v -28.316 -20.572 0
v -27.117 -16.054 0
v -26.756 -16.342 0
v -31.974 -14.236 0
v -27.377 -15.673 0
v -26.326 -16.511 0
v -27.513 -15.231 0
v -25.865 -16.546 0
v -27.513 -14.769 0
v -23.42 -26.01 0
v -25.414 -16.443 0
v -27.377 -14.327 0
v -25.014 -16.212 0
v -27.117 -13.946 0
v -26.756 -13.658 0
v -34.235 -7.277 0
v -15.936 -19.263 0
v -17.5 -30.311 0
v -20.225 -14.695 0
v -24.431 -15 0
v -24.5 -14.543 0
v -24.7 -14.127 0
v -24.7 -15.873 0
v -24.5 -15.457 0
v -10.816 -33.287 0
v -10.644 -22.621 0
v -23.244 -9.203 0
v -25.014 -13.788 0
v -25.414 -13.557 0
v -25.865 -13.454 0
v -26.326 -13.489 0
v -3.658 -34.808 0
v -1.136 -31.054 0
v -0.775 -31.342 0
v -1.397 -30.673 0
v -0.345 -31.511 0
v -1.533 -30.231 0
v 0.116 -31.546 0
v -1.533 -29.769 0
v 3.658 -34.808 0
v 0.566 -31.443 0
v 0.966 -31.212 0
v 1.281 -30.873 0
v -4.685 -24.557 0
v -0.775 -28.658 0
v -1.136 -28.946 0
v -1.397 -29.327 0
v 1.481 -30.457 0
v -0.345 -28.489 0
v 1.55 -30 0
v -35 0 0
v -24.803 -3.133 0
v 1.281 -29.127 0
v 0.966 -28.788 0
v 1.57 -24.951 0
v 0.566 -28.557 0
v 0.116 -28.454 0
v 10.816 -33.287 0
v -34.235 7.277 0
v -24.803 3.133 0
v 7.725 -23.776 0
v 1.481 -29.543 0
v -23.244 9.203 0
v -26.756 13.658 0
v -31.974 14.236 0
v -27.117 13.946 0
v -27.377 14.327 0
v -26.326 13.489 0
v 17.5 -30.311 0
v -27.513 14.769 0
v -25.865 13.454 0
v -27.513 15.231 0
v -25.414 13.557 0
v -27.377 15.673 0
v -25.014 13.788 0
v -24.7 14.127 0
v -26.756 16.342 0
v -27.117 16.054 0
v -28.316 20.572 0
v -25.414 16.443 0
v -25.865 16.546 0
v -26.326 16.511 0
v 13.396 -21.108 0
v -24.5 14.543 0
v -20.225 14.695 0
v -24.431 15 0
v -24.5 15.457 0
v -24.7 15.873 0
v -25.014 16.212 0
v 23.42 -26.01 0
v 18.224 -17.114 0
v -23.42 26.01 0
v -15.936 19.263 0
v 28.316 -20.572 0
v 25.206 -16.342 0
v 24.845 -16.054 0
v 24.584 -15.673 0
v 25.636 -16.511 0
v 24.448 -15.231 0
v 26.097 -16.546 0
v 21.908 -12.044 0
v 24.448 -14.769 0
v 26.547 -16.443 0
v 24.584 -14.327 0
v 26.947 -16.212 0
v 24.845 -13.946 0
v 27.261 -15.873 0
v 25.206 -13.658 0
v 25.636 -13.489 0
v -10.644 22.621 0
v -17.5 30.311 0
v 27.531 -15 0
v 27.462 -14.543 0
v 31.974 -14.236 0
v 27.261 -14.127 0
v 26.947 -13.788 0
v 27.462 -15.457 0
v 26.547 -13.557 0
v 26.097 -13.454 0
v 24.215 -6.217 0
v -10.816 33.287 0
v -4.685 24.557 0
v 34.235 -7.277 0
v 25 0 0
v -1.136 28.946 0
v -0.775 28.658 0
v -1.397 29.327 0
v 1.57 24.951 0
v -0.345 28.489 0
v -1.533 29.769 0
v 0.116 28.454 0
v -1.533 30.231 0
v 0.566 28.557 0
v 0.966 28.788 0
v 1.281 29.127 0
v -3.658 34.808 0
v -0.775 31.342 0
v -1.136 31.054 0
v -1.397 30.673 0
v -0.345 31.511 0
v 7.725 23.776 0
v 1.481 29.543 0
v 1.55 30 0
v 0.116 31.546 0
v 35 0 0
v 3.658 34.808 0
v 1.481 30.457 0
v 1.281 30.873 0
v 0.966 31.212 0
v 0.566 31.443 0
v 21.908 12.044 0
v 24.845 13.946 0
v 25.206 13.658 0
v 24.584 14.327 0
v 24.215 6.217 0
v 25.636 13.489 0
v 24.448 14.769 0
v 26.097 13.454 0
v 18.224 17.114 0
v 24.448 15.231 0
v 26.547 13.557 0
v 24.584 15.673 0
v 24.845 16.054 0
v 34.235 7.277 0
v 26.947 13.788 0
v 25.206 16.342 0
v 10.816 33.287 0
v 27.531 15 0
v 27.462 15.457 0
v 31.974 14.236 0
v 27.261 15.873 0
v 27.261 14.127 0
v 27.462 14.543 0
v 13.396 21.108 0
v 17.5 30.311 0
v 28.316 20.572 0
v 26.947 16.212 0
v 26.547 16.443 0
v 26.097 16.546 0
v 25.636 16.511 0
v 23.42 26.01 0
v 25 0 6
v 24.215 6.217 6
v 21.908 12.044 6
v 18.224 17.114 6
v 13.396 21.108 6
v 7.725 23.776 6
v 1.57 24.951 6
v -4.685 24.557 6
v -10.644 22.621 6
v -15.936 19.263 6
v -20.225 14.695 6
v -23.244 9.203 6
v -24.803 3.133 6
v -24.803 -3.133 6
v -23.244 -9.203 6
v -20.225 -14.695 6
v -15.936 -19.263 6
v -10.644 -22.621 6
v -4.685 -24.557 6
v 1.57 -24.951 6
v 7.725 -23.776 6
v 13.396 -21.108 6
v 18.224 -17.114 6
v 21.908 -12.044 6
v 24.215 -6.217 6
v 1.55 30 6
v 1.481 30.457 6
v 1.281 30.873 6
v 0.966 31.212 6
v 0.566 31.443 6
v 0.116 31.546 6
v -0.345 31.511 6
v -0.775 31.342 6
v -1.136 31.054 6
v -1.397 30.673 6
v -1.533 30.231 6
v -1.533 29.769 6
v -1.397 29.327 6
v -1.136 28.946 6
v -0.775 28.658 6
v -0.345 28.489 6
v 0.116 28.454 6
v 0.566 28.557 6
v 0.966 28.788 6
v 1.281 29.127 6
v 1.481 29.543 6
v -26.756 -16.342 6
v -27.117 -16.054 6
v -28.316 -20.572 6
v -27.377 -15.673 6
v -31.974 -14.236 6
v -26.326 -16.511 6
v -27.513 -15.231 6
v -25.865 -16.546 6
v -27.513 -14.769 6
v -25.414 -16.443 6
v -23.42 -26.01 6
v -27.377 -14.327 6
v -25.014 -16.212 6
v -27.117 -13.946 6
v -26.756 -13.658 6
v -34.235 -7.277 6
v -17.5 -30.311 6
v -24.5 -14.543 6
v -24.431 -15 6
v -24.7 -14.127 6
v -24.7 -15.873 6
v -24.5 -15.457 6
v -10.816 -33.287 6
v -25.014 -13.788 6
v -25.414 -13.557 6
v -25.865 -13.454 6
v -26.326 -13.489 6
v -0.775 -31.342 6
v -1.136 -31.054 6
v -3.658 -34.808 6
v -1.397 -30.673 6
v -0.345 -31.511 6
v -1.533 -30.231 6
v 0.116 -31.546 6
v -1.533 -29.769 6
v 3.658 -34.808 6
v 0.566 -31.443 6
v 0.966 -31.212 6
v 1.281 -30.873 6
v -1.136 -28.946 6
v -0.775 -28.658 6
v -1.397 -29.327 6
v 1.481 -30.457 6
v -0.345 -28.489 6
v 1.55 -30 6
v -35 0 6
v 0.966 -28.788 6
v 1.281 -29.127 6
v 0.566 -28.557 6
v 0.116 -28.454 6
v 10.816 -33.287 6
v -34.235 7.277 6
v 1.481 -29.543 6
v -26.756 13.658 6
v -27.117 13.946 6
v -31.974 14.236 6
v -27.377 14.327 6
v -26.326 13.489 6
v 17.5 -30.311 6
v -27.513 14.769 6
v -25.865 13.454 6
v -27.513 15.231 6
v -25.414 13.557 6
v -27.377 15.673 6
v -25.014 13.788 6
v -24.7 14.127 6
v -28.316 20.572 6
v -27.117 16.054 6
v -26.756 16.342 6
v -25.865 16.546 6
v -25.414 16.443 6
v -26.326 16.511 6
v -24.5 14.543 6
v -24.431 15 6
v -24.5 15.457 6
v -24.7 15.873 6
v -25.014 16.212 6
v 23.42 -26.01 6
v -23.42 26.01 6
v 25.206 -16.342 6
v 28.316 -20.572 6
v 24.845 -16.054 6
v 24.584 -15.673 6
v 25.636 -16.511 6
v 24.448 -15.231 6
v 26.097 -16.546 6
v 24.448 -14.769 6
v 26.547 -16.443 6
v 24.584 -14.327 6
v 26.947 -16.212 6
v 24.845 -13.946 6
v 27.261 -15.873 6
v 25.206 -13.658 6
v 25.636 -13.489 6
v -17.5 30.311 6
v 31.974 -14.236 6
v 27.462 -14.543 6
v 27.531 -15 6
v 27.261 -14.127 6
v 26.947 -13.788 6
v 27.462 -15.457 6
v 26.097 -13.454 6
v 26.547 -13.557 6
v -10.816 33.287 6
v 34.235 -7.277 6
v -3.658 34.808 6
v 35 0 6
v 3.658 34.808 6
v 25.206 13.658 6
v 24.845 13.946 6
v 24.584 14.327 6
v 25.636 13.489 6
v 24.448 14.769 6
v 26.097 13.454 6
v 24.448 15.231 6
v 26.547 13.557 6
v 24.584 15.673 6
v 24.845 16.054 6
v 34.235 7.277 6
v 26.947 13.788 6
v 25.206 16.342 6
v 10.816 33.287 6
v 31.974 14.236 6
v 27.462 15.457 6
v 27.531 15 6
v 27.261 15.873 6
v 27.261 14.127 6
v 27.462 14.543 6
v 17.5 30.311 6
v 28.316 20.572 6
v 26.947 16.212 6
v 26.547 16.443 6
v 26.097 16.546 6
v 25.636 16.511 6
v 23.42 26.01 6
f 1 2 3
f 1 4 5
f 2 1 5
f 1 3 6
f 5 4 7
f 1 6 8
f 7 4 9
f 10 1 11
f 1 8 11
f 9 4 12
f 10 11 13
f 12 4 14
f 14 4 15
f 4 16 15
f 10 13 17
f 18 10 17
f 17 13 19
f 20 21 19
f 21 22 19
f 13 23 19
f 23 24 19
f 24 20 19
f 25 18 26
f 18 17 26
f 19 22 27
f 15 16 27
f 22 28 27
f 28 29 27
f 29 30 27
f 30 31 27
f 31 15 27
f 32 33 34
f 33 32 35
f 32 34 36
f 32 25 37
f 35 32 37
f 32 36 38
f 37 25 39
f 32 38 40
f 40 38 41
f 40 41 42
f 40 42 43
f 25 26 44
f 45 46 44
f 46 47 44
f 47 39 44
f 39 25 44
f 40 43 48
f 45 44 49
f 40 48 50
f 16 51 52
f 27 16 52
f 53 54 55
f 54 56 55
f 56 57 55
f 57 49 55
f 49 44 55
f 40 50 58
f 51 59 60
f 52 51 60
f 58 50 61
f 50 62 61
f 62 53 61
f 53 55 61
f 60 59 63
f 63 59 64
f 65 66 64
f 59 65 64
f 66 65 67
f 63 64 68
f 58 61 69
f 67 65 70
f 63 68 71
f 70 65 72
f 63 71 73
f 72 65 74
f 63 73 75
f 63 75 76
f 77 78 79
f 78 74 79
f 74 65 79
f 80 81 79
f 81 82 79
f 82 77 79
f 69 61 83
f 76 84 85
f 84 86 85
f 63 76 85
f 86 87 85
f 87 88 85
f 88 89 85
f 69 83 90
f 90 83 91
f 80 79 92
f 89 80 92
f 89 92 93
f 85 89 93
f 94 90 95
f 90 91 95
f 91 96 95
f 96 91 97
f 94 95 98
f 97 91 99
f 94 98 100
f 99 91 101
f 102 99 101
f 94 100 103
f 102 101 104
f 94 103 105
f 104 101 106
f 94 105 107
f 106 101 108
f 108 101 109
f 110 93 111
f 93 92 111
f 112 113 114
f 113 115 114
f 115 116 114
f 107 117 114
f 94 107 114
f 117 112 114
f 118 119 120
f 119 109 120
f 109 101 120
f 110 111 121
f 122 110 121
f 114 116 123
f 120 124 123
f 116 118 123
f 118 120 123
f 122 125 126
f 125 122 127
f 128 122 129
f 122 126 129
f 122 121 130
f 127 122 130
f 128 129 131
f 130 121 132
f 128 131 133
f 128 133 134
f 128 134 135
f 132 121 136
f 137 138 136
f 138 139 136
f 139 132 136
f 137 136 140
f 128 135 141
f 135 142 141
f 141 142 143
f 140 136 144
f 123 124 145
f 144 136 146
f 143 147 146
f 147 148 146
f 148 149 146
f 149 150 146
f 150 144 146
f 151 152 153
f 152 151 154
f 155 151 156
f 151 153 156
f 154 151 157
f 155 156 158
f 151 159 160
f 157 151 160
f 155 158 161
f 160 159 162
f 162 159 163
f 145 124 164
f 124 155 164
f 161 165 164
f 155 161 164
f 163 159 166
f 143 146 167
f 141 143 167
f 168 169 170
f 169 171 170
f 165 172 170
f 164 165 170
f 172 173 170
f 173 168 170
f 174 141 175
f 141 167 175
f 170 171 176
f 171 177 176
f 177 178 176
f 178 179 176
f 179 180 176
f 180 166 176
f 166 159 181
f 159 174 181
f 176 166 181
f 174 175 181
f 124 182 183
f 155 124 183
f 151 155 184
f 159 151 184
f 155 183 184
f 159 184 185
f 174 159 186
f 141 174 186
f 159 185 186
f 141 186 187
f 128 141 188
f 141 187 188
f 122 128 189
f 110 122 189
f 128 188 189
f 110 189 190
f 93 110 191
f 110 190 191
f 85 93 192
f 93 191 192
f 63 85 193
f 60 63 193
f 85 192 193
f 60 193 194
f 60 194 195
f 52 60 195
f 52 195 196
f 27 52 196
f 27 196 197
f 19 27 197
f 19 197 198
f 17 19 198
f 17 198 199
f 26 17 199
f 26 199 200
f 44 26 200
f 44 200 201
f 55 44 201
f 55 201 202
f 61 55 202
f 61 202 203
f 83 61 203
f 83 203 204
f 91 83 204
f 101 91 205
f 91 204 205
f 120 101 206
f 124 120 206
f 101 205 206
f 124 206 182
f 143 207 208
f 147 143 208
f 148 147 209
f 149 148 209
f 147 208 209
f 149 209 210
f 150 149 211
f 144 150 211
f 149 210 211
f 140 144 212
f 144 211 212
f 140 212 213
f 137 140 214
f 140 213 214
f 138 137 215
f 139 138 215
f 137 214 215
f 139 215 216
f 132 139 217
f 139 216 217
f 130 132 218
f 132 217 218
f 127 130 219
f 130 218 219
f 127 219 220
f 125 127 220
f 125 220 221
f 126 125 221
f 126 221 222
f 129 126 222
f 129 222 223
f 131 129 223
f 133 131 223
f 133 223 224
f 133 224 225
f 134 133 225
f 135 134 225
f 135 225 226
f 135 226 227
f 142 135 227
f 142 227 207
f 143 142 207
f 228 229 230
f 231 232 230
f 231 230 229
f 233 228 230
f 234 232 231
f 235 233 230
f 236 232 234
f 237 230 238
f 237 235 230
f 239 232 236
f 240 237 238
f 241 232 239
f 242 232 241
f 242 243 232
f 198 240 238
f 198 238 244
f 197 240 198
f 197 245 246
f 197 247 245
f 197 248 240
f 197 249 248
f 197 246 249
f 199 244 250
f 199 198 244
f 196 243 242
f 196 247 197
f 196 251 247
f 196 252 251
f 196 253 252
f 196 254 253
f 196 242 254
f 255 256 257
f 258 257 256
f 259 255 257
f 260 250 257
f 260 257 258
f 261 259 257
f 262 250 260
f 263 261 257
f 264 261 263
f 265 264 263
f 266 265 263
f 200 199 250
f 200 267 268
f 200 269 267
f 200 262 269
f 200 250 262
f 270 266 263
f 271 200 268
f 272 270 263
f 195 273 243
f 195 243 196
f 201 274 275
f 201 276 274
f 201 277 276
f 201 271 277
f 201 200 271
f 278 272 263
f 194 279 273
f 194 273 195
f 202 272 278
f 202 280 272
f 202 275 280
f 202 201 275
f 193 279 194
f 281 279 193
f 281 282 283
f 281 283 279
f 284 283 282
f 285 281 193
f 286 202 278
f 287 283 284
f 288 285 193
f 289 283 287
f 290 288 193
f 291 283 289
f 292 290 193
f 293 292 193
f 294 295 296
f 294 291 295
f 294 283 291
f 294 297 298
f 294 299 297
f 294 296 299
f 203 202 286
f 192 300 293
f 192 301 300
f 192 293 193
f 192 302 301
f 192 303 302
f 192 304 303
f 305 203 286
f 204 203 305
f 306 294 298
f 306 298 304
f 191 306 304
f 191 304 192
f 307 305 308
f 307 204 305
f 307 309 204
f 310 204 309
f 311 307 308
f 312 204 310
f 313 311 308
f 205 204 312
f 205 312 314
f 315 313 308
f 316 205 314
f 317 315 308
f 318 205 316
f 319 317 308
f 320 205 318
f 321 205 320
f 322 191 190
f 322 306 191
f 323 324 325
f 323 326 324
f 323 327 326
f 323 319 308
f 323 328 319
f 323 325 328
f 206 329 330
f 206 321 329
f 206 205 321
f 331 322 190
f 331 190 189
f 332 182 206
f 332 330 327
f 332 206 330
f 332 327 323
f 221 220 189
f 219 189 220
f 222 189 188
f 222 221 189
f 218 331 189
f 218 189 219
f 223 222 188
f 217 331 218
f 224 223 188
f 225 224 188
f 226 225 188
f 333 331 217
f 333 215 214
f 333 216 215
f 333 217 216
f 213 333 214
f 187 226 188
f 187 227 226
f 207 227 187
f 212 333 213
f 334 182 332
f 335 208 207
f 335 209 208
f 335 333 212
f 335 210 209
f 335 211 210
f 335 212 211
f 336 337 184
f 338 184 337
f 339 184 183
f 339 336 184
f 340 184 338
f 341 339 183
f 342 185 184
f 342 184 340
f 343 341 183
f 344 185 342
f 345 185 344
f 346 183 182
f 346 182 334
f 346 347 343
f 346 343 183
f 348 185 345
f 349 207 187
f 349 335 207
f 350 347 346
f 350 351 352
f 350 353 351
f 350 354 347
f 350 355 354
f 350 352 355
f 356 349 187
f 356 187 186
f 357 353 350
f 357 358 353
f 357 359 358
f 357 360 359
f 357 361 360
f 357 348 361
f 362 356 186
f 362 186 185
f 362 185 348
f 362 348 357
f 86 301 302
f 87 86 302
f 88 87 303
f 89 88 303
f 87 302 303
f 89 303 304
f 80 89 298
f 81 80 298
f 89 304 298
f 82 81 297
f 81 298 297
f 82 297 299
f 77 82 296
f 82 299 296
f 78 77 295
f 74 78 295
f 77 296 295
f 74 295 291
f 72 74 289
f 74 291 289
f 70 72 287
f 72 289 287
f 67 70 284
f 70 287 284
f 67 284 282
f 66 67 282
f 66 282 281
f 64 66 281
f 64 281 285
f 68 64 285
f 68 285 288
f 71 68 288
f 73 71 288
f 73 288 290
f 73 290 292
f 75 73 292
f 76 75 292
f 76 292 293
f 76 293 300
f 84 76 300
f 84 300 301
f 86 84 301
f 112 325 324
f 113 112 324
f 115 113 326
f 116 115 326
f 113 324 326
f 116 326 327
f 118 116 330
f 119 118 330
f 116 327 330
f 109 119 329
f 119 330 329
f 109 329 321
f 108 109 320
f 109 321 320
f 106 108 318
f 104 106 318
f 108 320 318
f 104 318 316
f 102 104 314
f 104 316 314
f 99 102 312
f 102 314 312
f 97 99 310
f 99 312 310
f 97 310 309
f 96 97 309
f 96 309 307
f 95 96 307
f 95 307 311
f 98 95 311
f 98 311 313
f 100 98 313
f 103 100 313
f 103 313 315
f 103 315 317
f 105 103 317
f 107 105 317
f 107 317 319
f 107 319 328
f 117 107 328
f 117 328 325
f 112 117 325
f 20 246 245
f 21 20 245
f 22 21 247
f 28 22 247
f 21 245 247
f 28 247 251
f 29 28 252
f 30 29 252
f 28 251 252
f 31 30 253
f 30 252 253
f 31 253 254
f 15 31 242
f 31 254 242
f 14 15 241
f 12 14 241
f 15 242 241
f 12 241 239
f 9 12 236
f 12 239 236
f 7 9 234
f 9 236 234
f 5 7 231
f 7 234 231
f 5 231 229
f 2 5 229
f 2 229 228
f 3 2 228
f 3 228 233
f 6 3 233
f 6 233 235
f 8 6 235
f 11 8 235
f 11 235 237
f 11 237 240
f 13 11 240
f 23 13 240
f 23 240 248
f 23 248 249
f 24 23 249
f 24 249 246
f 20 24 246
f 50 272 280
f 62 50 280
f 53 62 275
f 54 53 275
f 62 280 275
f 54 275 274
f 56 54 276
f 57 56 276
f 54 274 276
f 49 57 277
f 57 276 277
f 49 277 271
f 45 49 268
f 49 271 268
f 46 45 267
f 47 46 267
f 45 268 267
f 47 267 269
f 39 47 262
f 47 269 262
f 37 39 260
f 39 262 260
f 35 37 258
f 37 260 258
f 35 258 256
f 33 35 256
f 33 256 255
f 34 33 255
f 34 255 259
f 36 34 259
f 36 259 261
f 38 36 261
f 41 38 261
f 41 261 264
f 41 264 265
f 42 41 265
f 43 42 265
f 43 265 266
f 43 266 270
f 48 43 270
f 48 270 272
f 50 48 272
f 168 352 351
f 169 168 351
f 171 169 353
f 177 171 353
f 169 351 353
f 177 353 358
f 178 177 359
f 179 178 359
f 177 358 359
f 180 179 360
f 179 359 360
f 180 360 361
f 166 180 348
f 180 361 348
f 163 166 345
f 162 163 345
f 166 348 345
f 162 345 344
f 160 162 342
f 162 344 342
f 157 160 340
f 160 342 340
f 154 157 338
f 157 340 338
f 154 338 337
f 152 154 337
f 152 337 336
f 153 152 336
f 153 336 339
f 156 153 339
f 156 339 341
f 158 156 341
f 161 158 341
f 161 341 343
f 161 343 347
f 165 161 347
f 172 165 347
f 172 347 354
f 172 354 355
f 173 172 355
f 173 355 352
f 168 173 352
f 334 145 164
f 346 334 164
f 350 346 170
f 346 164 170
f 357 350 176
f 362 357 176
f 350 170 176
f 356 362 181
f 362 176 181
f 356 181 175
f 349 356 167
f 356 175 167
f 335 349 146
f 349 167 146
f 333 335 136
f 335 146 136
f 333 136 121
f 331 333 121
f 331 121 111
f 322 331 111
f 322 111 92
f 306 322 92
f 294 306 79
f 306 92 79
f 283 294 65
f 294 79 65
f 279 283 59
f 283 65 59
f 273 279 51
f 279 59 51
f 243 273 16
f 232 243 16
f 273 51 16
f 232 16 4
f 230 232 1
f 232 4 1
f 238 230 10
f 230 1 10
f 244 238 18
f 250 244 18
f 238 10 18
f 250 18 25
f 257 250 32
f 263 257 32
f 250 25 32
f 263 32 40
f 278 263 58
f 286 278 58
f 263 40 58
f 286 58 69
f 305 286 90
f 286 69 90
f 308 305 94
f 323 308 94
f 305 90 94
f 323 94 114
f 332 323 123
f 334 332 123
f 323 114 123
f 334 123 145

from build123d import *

# Parameters (mm, degrees)
F0_R     = 35
F1_DEPTH = 6
F2_R     = 1.55
F3_DEPTH = 6.001
F4_R     = 25
F5_DEPTH = 6.001


with BuildPart() as f1:
    # F0 (on Top) → F1 (new body)
    with BuildSketch(Plane.XY):
        Circle(F0_R)
    extrude(amount=F1_DEPTH)

    # F2 (on face) → F3 (cut, through all)
    with BuildSketch(Plane.XY.offset(6)):
        with Locations((0, 30)):
            Circle(F2_R)
        with Locations((-25.980762, 15)):
            Circle(F2_R)
        with Locations((-25.980762, -15)):
            Circle(F2_R)
        with Locations((25.980762, 15)):
            Circle(F2_R)
        with Locations((25.980762, -15)):
            Circle(F2_R)
        with Locations((0, -30)):
            Circle(F2_R)
    extrude(amount=-F3_DEPTH, mode=Mode.SUBTRACT)

    # F4 (on face) → F5 (cut, through all)
    with BuildSketch(Plane.XY.offset(6)):
        Circle(F4_R)
    extrude(amount=-F5_DEPTH, mode=Mode.SUBTRACT)


solid = f1.part
